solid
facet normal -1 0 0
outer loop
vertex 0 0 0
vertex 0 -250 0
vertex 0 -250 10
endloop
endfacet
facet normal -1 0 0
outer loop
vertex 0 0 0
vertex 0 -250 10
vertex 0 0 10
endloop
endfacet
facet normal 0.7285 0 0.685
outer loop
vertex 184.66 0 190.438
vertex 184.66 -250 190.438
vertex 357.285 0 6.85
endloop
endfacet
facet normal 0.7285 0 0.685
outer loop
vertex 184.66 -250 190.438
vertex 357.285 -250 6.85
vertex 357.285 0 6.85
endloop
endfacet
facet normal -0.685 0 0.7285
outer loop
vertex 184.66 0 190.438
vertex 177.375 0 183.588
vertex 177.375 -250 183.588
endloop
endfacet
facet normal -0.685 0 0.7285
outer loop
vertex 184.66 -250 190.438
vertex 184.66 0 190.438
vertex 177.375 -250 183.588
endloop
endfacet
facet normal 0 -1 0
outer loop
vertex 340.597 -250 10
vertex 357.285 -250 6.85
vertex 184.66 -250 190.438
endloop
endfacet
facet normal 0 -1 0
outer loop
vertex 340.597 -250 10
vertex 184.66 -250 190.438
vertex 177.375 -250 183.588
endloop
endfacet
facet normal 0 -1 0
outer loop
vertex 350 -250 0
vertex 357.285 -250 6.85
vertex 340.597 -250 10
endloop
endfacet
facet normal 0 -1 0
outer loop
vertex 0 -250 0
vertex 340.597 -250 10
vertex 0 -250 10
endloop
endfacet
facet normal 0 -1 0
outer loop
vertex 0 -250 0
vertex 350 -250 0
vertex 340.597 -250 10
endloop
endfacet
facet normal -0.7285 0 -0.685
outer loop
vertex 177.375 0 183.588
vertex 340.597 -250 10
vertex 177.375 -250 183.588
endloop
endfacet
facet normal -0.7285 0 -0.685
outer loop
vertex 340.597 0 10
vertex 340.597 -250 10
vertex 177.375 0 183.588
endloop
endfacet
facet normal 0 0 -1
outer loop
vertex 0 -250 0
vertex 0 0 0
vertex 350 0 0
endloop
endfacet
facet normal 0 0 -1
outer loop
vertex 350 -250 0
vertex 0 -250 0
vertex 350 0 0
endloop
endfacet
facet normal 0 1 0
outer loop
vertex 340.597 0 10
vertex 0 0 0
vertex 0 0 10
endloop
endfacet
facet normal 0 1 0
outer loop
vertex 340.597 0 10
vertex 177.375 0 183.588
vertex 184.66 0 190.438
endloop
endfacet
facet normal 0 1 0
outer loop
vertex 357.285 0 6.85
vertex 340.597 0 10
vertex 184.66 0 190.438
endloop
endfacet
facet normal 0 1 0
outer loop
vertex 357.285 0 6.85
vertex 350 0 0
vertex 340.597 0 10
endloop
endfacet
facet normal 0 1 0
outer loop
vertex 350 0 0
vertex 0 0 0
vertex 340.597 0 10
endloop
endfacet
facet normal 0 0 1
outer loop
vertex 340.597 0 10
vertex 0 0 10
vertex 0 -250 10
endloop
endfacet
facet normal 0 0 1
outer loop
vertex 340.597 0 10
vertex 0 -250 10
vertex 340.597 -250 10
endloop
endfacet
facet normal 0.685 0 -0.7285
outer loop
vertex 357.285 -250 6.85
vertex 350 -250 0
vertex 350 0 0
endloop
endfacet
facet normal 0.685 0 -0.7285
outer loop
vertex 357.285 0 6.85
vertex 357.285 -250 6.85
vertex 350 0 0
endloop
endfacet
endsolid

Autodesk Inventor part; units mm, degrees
ref_plane "YZ Plane" through (0, 0, 0) normal (1, 0, 0) x (0, 1, 0)
ref_plane "XZ Plane" through (0, 0, 0) normal (0, 1, 0) x (-1, 0, 0)
sketch "Boceto1" plane through (0, 0, 0) normal (0, 0, 1) x (1, 0, 0)
  line L0 (0, 0) -> (350, 0)
  line L1 (350, 0) -> (350, -250)
  line L2 (350, -250) -> (0, -250)
  line L3 (0, -250) -> (0, 0)
  dimension "d0" = 350
  dimension "d1" = 250
extrude "Extrusión1" add sketch "Boceto1" along normal blind 10
ref_plane "Plano de trabajo1" through (350, -250, 0) normal (-0.7285, 0, -0.685) x (0, 1, 0)
sketch "Boceto2" plane through (350, -250, 0) normal (-0.7285, 0, -0.685) x (0, 1, 0)
  line L0 (0, 0) -> (250, 0) projected
  line L1 (0, 0) -> (250, 0)
  line L2 (250, 0) -> (250, -252)
  line L3 (250, -252) -> (0, -252)
  line L4 (0, -252) -> (0, 0)
  point P0 (250, -239.7606)
  point P1 (250, 0)
  dimension "d5" = 250
  dimension "d6" = 252
extrude "Extrusión2" add sketch "Boceto2" against normal blind 10
sketch "Boceto3" plane through (357.2851, -250, 6.8503) normal (0.7285, 0, 0.685) x (0.685, 0, -0.7285)
  arc A0 (-179.2335, 22.3949) -> (-179.2335, 102.4229) centre (-179.2335, 62.4089) ccw
  line L0 (-179.2335, 22.3949) -> (-205.9095, 22.3949)
  line L1 (-205.9095, 22.3949) -> (-205.9095, 89.0849)
  line L2 (-179.2335, 89.0849) -> (-192.5715, 89.0849)
  line L3 (-192.5715, 89.0849) -> (-192.5715, 35.7329)
  line L4 (-192.5715, 35.7329) -> (-179.2335, 35.7329)
  arc A1 (-179.2335, 35.7329) -> (-179.2335, 89.0849) centre (-179.2335, 62.4089) ccw
  line L5 (-192.5715, 89.0849) -> (-205.9095, 89.0849)
  line L6 (-192.5715, 102.4229) -> (-192.5715, 89.0849)
  line L7 (-200.5743, 127.8046) -> (-200.5743, 117.1342)
  line L8 (-200.5743, 117.1342) -> (-157.8927, 117.1342)
  line L9 (-157.8927, 117.1342) -> (-157.8927, 127.8046)
  arc A2 (-157.8927, 127.8046) -> (-200.5743, 127.8046) centre (-179.2335, 127.8046) ccw
  line L10 (-200.5743, 160.5789) -> (-203.2419, 160.5789)
  line L11 (-200.5743, 160.5789) -> (-197.9067, 160.5789)
  line L12 (-191.2377, 160.5789) -> (-157.8927, 160.5789)
  line L13 (-200.5743, 183.5325) -> (-200.5743, 172.8621)
  line L14 (-200.5743, 172.8621) -> (-157.8927, 172.8621)
  arc A3 (-157.8927, 183.5325) -> (-200.5743, 183.5325) centre (-179.2335, 183.5325) ccw
  line L15 (-157.8927, 172.8621) -> (-157.8927, 183.5325)
  line L16 (-200.5743, 216.4887) -> (-203.2419, 216.4887)
  line L17 (-200.5743, 216.4887) -> (-197.9067, 216.4887)
  line L18 (-191.2377, 216.4887) -> (-157.8927, 216.4887)
  line L19 (-192.5715, 102.4229) -> (-179.2335, 102.4229)
  line L20 (-75.4492, 148.487) -> (-58.3492, 148.487)
  line L21 (-58.3492, 170.7597) -> (-64.3342, 170.7597)
  line L22 (-92.5492, 135.662) -> (-75.4492, 148.487)
  line L23 (-92.5492, 161.312) -> (-75.4492, 148.487)
  line L24 (-92.5492, 180.5891) -> (-58.3492, 193.4141)
  line L25 (-92.5492, 206.2391) -> (-58.3492, 193.4141)
  line L26 (-58.3492, 215.852) -> (-64.3342, 215.852)
  line L27 (-58.6269, 85.751) -> (-92.8269, 85.751)
  arc A4 (-71.4519, 98.576) -> (-92.8269, 98.576) centre (-82.1394, 98.576) ccw
  line L28 (-71.4519, 98.576) -> (-71.4519, 85.751)
  line L29 (-58.6269, 30.982) -> (-92.8269, 39.532)
  line L30 (-92.8269, 39.532) -> (-58.6269, 48.082)
  line L31 (-92.8269, 56.632) -> (-58.6269, 48.082)
  line L32 (-92.8269, 56.632) -> (-58.6269, 65.182)
  line L33 (-58.6269, 75.322) -> (-64.6119, 75.322)
  line L34 (-92.8269, 85.751) -> (-92.8269, 98.576)
  line L35 (-58.6269, 118.6704) -> (-64.6119, 118.6704)
  point P0 (-239.7606, 250)
  point P1 (-58.6269, 30.982)
properties part number "Logo_names"
